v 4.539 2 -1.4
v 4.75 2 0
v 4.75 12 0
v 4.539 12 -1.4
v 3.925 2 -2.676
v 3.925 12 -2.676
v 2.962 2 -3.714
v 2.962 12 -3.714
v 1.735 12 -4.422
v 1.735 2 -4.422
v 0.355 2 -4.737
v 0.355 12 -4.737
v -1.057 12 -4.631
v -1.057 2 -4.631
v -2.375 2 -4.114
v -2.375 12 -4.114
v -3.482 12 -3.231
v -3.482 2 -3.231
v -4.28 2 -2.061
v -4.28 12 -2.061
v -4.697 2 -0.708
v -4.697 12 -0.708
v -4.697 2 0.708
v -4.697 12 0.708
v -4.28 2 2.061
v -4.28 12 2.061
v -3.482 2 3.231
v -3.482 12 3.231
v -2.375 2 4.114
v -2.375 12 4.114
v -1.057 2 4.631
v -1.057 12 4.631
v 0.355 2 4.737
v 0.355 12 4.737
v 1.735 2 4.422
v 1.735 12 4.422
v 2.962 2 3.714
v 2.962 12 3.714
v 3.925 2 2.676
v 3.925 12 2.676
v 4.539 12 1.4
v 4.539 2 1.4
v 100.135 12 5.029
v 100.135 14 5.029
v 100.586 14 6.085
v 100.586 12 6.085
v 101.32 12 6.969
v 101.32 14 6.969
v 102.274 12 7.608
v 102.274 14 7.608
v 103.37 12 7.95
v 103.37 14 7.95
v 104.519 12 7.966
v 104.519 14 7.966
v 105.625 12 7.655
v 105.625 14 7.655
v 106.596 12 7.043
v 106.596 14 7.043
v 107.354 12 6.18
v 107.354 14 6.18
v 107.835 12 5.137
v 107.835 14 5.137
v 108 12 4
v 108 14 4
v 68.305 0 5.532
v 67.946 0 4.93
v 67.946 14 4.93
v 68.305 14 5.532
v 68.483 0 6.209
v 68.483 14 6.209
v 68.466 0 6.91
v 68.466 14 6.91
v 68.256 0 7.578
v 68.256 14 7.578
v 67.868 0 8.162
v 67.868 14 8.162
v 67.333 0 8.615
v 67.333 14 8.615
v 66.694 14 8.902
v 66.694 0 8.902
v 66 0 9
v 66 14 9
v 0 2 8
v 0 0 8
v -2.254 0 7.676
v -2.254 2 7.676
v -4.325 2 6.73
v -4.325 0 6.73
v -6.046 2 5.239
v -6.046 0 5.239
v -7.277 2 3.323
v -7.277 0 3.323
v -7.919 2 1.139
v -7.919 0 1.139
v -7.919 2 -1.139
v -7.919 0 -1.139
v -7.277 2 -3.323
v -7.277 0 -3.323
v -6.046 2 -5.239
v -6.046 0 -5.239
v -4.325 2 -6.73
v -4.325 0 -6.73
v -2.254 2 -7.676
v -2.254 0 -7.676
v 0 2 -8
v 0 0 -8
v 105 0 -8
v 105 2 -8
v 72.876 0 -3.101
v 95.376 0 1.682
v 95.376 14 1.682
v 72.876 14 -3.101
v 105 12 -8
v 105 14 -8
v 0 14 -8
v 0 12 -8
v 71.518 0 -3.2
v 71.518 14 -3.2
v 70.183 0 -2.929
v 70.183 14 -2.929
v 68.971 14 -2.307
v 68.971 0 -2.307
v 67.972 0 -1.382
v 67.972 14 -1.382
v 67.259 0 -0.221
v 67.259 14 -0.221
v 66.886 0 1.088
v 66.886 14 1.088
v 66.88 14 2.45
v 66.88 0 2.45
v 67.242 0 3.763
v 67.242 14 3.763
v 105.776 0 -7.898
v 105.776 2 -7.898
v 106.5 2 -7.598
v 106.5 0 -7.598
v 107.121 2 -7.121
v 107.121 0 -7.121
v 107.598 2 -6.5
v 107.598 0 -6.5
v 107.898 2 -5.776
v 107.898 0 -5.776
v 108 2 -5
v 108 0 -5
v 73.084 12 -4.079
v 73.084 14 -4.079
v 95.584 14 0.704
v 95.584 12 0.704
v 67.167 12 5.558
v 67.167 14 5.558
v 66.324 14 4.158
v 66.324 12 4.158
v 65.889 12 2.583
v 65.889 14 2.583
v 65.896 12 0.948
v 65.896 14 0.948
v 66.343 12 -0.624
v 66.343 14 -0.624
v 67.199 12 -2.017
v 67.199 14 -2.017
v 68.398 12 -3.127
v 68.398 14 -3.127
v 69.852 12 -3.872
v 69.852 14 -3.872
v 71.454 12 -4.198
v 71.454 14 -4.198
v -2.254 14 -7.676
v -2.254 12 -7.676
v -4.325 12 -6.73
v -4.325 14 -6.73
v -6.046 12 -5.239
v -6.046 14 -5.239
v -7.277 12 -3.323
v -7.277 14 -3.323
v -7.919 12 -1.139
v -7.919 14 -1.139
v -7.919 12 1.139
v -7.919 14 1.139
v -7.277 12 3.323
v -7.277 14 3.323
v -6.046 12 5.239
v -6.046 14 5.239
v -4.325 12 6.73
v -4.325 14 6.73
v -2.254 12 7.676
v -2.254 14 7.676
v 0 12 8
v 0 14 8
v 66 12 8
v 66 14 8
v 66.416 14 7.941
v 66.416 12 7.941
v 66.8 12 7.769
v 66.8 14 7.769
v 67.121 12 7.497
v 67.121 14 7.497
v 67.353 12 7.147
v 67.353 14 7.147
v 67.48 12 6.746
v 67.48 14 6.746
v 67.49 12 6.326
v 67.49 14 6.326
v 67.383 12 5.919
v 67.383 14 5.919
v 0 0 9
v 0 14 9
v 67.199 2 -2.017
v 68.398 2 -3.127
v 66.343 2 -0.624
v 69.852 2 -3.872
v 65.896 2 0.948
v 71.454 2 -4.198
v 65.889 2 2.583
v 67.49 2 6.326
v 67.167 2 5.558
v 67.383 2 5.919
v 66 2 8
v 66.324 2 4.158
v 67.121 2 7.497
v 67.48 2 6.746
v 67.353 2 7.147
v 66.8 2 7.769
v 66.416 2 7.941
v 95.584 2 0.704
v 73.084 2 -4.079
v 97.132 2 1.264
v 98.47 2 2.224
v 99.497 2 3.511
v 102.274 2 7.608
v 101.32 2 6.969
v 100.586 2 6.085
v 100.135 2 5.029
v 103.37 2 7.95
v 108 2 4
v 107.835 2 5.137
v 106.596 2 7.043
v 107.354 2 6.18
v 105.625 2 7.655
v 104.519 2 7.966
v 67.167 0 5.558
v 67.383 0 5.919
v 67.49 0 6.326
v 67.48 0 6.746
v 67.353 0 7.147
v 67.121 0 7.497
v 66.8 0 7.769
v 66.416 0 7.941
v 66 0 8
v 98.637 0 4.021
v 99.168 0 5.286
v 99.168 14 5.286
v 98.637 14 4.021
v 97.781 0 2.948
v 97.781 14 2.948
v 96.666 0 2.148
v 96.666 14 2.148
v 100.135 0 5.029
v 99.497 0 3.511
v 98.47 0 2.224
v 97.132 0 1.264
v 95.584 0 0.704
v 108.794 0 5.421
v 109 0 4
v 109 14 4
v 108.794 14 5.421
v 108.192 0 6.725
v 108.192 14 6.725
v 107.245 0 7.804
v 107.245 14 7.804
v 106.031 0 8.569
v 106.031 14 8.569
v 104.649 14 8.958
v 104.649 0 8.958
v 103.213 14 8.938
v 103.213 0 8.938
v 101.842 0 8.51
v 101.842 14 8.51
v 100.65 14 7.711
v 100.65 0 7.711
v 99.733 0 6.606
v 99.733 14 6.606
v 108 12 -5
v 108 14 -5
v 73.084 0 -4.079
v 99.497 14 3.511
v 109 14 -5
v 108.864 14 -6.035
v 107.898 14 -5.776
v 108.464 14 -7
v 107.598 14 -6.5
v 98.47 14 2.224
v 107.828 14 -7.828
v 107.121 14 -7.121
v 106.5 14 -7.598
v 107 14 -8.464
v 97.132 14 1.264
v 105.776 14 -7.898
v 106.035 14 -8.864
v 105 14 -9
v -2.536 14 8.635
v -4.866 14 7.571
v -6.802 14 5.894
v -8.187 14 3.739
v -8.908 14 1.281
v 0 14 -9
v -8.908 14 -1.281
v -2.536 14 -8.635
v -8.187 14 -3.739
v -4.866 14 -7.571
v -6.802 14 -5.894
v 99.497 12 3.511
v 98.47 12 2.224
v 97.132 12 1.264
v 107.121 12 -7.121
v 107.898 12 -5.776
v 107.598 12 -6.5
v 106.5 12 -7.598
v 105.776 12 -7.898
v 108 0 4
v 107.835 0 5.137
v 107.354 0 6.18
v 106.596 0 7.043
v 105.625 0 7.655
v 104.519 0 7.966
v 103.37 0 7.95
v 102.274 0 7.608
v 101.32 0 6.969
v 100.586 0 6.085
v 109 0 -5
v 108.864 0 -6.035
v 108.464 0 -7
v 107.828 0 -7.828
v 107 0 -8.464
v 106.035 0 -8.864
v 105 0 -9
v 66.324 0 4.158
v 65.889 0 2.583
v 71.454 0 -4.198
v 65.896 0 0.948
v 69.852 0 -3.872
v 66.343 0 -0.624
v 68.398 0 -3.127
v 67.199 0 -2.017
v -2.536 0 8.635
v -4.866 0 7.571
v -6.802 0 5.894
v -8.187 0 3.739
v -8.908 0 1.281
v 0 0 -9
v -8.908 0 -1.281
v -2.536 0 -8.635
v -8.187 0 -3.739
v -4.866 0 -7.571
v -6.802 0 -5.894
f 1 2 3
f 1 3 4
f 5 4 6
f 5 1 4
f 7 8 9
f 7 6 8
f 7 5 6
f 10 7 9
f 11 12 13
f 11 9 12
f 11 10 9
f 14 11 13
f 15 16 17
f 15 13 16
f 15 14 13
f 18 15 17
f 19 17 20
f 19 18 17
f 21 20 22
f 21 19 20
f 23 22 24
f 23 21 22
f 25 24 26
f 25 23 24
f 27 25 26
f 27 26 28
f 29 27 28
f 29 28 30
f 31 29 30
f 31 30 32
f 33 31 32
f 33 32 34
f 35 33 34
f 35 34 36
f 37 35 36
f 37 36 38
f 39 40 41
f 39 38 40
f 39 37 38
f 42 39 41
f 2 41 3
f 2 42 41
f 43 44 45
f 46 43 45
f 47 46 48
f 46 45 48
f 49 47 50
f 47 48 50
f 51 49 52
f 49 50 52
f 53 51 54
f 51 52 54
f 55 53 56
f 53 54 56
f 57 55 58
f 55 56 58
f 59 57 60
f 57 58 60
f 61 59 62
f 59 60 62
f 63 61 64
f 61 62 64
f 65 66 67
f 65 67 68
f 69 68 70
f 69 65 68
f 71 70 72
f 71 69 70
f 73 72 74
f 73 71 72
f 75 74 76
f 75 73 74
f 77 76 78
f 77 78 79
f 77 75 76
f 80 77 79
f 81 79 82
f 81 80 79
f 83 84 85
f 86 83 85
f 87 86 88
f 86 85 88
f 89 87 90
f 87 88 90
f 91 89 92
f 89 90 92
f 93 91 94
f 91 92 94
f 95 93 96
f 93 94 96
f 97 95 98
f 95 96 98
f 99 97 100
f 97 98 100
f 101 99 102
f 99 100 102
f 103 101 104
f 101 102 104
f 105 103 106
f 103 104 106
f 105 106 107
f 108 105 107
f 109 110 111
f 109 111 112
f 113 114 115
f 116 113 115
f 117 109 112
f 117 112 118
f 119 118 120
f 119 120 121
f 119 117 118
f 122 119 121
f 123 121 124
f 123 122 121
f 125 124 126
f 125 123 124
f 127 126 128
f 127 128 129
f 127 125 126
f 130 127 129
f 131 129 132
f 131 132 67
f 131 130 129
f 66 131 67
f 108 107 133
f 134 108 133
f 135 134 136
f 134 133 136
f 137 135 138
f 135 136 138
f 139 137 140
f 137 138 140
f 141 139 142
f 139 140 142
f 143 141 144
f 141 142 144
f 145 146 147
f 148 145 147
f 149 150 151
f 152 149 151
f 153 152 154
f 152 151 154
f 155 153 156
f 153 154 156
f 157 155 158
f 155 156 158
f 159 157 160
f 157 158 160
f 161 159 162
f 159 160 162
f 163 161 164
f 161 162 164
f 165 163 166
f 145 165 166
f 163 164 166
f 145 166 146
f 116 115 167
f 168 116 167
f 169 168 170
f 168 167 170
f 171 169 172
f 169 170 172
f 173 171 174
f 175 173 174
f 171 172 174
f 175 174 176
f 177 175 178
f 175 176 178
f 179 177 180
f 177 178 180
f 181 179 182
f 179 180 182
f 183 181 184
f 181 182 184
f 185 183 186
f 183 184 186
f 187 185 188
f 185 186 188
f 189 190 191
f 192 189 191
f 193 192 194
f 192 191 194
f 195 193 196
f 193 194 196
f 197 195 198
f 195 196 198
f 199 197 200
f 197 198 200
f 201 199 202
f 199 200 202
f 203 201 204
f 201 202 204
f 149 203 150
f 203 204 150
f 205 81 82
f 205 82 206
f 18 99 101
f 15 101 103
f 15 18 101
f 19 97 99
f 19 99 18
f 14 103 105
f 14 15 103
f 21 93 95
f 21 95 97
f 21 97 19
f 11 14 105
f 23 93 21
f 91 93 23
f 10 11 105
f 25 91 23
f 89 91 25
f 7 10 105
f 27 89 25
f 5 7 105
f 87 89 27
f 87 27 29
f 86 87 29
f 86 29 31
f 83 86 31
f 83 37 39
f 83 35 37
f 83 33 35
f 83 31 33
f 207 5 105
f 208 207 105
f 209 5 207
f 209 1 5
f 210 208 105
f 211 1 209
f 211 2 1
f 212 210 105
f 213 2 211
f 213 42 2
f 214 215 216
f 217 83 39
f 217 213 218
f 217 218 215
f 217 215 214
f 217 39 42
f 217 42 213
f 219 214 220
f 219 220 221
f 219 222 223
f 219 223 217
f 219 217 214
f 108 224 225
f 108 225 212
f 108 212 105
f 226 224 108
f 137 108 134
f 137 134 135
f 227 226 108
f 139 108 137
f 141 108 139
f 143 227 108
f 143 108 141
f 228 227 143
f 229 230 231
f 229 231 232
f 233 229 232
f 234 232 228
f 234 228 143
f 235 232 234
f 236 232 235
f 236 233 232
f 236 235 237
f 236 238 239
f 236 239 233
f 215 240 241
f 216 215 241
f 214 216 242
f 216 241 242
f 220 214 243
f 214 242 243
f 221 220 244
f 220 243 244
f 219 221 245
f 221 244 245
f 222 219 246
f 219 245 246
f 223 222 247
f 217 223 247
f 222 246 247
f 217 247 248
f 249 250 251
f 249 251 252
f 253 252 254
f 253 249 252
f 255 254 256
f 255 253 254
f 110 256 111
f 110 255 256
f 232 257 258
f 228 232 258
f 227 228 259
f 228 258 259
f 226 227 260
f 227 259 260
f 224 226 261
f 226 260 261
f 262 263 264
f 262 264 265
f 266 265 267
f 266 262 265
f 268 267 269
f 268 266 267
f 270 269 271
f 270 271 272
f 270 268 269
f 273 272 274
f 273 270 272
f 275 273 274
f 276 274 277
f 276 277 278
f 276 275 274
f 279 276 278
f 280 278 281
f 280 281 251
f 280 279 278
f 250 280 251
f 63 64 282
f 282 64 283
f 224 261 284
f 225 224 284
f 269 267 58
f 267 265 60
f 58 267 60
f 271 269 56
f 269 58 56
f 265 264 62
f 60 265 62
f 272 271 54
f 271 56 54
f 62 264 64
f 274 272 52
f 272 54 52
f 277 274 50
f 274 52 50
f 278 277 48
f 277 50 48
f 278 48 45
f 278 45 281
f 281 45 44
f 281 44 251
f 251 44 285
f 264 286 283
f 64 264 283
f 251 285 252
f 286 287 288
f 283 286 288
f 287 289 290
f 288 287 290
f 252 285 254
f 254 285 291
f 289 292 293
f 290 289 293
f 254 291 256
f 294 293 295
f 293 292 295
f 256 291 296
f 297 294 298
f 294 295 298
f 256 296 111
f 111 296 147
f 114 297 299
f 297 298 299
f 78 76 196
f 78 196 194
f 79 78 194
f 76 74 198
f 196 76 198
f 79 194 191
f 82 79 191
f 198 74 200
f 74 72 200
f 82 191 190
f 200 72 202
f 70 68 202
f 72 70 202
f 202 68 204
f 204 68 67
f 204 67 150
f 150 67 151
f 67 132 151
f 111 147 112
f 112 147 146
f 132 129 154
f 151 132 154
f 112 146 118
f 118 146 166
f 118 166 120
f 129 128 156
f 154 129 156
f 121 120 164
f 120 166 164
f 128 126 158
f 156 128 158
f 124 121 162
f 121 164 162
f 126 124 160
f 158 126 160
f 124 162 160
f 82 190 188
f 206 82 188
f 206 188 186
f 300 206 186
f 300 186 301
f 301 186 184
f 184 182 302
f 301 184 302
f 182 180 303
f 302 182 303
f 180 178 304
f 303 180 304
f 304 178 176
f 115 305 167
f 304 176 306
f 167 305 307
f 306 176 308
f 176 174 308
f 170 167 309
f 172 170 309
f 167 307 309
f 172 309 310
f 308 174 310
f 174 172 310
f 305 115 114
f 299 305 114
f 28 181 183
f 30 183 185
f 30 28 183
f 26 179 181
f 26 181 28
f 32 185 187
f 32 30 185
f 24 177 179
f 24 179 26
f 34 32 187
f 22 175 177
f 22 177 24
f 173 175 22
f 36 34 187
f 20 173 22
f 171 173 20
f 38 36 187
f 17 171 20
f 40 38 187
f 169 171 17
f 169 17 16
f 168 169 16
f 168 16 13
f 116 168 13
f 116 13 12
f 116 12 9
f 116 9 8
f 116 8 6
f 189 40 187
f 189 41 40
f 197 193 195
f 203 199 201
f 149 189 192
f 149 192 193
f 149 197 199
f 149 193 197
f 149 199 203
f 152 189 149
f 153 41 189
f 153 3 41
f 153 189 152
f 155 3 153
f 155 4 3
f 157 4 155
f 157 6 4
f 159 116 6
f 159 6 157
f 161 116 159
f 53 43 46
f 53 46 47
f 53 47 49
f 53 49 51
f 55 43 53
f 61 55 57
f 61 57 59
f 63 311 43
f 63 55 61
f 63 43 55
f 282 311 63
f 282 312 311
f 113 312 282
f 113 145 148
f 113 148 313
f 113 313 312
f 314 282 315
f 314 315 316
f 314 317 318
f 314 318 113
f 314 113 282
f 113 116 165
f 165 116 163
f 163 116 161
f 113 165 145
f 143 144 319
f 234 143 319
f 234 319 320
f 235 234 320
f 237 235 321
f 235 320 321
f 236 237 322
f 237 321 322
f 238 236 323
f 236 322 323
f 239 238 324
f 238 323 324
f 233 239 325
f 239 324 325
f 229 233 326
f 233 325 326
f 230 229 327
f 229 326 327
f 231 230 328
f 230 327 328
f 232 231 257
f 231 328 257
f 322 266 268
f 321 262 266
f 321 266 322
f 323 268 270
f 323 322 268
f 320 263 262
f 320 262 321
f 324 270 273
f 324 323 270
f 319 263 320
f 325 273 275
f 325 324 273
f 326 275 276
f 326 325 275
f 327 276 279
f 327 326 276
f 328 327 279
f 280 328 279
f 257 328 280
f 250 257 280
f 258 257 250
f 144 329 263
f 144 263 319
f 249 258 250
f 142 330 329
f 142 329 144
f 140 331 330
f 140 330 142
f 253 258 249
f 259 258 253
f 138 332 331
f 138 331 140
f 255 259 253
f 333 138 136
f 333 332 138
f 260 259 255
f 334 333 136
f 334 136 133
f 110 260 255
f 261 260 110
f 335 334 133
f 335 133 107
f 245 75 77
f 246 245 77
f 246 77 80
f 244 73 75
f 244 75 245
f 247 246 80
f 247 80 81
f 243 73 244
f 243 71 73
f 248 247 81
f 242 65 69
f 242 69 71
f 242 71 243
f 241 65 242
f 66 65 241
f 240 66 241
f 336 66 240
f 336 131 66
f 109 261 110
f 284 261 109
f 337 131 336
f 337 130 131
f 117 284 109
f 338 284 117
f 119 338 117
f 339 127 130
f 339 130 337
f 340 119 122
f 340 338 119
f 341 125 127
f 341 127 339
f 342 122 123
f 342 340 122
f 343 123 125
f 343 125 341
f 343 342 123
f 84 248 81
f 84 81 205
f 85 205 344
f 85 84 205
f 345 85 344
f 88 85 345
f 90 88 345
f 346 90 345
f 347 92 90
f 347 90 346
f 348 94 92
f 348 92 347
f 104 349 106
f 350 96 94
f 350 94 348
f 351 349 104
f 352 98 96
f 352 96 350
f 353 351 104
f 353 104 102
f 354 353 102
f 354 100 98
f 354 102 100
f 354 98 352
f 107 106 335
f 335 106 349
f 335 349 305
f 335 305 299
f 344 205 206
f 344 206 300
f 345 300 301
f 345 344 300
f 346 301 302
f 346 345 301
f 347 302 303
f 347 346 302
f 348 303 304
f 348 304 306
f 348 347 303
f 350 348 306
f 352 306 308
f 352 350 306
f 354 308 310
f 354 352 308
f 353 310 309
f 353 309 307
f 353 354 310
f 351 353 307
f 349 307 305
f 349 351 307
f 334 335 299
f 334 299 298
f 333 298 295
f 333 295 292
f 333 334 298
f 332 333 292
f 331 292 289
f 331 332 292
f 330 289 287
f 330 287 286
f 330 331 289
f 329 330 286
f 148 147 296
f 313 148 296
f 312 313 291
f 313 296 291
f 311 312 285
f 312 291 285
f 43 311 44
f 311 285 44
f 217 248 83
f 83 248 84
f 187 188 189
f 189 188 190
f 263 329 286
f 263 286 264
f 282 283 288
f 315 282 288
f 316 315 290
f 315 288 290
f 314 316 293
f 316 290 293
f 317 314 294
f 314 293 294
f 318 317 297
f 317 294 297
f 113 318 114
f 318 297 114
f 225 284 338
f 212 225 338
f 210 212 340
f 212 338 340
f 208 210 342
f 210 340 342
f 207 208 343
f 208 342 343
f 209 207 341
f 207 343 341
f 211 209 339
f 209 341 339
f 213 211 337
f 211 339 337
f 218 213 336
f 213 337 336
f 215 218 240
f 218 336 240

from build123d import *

# Parameters (mm, degrees)
SKETCH1_R           = 4.75
BOSS_EXTRUDE1_DEPTH = 14
CUT_EXTRUDE1_DEPTH  = 2
CUT_EXTRUDE2_DEPTH  = 2


with BuildPart() as part:
    # Sketch1 → Boss-Extrude1 (new body)
    with BuildSketch(Plane(origin=(0, 0, 0), x_dir=(1, 0, 0), z_dir=(0, 1, 0))):
        with BuildLine():
            Line((0, 9), (105, 9))
            ThreePointArc((105, 9), (107.828427125, 7.828427125), (109, 5))
            Line((109, 5), (109, -4))
            ThreePointArc((109, -4), (104.648590849, -8.957754523), (99.168268036, -5.286221686))
            ThreePointArc((99.168268036, -5.286221686), (97.78126353, -2.948377598), (95.376094526, -1.681705369))
            Line((95.376094526, -1.681705369), (72.876094526, 3.100817269))
            ThreePointArc((72.876094526, 3.100817269), (67.575536844, 0.826161371), (67.945512024, -4.929973578))
            ThreePointArc((67.945512024, -4.929973578), (68.255556035, -7.578177617), (66, -9))
            Line((66, -9), (0, -9))
            ThreePointArc((0, -9), (-9, 0), (0, 9))
        make_face()
        Circle(SKETCH1_R, mode=Mode.SUBTRACT)
    extrude(amount=BOSS_EXTRUDE1_DEPTH)

    # Sketch4 → Cut-Extrude1 (cut)
    with BuildSketch(Plane(origin=(0, 14, 0), x_dir=(1, 0, 0), z_dir=(0, 1, 0))):
        with BuildLine():
            Line((0, -8), (66, -8))
            ThreePointArc((66, -8), (67.353333621, -7.14690657), (67.167307214, -5.557984147))
            ThreePointArc((67.167307214, -5.557984147), (66.723336999, 1.349377792), (73.084006216, 4.07896487))
            Line((73.084006216, 4.07896487), (95.584006216, -0.703557768))
            ThreePointArc((95.584006216, -0.703557768), (98.470209022, -2.223564443), (100.134614429, -5.028977349))
            ThreePointArc((100.134614429, -5.028977349), (104.518872679, -7.966203618), (108, -4))
            Line((108, -4), (108, 5))
            ThreePointArc((108, 5), (107.121320344, 7.121320344), (105, 8))
            Line((105, 8), (0, 8))
            ThreePointArc((0, 8), (-8, 0), (0, -8))
        make_face()
    extrude(amount=-CUT_EXTRUDE1_DEPTH, mode=Mode.SUBTRACT)

    # Sketch5 → Cut-Extrude2 (cut)
    with BuildSketch(Plane.XZ):
        with BuildLine():
            Line((0, -8), (105, -8))
            ThreePointArc((105, -8), (107.121320344, -7.121320344), (108, -5))
            Line((108, -5), (108, 4))
            ThreePointArc((108, 4), (104.518872679, 7.966203618), (100.134614429, 5.028977349))
            ThreePointArc((100.134614429, 5.028977349), (98.470209022, 2.223564443), (95.584006216, 0.703557768))
            Line((95.584006216, 0.703557768), (73.084006216, -4.07896487))
            ThreePointArc((73.084006216, -4.07896487), (66.723336999, -1.349377792), (67.167307214, 5.557984147))
            ThreePointArc((67.167307214, 5.557984147), (67.353333621, 7.14690657), (66, 8))
            Line((66, 8), (0, 8))
            ThreePointArc((0, 8), (-8, 0), (0, -8))
        make_face()
    extrude(amount=-CUT_EXTRUDE2_DEPTH, mode=Mode.SUBTRACT)


solid = part.part
